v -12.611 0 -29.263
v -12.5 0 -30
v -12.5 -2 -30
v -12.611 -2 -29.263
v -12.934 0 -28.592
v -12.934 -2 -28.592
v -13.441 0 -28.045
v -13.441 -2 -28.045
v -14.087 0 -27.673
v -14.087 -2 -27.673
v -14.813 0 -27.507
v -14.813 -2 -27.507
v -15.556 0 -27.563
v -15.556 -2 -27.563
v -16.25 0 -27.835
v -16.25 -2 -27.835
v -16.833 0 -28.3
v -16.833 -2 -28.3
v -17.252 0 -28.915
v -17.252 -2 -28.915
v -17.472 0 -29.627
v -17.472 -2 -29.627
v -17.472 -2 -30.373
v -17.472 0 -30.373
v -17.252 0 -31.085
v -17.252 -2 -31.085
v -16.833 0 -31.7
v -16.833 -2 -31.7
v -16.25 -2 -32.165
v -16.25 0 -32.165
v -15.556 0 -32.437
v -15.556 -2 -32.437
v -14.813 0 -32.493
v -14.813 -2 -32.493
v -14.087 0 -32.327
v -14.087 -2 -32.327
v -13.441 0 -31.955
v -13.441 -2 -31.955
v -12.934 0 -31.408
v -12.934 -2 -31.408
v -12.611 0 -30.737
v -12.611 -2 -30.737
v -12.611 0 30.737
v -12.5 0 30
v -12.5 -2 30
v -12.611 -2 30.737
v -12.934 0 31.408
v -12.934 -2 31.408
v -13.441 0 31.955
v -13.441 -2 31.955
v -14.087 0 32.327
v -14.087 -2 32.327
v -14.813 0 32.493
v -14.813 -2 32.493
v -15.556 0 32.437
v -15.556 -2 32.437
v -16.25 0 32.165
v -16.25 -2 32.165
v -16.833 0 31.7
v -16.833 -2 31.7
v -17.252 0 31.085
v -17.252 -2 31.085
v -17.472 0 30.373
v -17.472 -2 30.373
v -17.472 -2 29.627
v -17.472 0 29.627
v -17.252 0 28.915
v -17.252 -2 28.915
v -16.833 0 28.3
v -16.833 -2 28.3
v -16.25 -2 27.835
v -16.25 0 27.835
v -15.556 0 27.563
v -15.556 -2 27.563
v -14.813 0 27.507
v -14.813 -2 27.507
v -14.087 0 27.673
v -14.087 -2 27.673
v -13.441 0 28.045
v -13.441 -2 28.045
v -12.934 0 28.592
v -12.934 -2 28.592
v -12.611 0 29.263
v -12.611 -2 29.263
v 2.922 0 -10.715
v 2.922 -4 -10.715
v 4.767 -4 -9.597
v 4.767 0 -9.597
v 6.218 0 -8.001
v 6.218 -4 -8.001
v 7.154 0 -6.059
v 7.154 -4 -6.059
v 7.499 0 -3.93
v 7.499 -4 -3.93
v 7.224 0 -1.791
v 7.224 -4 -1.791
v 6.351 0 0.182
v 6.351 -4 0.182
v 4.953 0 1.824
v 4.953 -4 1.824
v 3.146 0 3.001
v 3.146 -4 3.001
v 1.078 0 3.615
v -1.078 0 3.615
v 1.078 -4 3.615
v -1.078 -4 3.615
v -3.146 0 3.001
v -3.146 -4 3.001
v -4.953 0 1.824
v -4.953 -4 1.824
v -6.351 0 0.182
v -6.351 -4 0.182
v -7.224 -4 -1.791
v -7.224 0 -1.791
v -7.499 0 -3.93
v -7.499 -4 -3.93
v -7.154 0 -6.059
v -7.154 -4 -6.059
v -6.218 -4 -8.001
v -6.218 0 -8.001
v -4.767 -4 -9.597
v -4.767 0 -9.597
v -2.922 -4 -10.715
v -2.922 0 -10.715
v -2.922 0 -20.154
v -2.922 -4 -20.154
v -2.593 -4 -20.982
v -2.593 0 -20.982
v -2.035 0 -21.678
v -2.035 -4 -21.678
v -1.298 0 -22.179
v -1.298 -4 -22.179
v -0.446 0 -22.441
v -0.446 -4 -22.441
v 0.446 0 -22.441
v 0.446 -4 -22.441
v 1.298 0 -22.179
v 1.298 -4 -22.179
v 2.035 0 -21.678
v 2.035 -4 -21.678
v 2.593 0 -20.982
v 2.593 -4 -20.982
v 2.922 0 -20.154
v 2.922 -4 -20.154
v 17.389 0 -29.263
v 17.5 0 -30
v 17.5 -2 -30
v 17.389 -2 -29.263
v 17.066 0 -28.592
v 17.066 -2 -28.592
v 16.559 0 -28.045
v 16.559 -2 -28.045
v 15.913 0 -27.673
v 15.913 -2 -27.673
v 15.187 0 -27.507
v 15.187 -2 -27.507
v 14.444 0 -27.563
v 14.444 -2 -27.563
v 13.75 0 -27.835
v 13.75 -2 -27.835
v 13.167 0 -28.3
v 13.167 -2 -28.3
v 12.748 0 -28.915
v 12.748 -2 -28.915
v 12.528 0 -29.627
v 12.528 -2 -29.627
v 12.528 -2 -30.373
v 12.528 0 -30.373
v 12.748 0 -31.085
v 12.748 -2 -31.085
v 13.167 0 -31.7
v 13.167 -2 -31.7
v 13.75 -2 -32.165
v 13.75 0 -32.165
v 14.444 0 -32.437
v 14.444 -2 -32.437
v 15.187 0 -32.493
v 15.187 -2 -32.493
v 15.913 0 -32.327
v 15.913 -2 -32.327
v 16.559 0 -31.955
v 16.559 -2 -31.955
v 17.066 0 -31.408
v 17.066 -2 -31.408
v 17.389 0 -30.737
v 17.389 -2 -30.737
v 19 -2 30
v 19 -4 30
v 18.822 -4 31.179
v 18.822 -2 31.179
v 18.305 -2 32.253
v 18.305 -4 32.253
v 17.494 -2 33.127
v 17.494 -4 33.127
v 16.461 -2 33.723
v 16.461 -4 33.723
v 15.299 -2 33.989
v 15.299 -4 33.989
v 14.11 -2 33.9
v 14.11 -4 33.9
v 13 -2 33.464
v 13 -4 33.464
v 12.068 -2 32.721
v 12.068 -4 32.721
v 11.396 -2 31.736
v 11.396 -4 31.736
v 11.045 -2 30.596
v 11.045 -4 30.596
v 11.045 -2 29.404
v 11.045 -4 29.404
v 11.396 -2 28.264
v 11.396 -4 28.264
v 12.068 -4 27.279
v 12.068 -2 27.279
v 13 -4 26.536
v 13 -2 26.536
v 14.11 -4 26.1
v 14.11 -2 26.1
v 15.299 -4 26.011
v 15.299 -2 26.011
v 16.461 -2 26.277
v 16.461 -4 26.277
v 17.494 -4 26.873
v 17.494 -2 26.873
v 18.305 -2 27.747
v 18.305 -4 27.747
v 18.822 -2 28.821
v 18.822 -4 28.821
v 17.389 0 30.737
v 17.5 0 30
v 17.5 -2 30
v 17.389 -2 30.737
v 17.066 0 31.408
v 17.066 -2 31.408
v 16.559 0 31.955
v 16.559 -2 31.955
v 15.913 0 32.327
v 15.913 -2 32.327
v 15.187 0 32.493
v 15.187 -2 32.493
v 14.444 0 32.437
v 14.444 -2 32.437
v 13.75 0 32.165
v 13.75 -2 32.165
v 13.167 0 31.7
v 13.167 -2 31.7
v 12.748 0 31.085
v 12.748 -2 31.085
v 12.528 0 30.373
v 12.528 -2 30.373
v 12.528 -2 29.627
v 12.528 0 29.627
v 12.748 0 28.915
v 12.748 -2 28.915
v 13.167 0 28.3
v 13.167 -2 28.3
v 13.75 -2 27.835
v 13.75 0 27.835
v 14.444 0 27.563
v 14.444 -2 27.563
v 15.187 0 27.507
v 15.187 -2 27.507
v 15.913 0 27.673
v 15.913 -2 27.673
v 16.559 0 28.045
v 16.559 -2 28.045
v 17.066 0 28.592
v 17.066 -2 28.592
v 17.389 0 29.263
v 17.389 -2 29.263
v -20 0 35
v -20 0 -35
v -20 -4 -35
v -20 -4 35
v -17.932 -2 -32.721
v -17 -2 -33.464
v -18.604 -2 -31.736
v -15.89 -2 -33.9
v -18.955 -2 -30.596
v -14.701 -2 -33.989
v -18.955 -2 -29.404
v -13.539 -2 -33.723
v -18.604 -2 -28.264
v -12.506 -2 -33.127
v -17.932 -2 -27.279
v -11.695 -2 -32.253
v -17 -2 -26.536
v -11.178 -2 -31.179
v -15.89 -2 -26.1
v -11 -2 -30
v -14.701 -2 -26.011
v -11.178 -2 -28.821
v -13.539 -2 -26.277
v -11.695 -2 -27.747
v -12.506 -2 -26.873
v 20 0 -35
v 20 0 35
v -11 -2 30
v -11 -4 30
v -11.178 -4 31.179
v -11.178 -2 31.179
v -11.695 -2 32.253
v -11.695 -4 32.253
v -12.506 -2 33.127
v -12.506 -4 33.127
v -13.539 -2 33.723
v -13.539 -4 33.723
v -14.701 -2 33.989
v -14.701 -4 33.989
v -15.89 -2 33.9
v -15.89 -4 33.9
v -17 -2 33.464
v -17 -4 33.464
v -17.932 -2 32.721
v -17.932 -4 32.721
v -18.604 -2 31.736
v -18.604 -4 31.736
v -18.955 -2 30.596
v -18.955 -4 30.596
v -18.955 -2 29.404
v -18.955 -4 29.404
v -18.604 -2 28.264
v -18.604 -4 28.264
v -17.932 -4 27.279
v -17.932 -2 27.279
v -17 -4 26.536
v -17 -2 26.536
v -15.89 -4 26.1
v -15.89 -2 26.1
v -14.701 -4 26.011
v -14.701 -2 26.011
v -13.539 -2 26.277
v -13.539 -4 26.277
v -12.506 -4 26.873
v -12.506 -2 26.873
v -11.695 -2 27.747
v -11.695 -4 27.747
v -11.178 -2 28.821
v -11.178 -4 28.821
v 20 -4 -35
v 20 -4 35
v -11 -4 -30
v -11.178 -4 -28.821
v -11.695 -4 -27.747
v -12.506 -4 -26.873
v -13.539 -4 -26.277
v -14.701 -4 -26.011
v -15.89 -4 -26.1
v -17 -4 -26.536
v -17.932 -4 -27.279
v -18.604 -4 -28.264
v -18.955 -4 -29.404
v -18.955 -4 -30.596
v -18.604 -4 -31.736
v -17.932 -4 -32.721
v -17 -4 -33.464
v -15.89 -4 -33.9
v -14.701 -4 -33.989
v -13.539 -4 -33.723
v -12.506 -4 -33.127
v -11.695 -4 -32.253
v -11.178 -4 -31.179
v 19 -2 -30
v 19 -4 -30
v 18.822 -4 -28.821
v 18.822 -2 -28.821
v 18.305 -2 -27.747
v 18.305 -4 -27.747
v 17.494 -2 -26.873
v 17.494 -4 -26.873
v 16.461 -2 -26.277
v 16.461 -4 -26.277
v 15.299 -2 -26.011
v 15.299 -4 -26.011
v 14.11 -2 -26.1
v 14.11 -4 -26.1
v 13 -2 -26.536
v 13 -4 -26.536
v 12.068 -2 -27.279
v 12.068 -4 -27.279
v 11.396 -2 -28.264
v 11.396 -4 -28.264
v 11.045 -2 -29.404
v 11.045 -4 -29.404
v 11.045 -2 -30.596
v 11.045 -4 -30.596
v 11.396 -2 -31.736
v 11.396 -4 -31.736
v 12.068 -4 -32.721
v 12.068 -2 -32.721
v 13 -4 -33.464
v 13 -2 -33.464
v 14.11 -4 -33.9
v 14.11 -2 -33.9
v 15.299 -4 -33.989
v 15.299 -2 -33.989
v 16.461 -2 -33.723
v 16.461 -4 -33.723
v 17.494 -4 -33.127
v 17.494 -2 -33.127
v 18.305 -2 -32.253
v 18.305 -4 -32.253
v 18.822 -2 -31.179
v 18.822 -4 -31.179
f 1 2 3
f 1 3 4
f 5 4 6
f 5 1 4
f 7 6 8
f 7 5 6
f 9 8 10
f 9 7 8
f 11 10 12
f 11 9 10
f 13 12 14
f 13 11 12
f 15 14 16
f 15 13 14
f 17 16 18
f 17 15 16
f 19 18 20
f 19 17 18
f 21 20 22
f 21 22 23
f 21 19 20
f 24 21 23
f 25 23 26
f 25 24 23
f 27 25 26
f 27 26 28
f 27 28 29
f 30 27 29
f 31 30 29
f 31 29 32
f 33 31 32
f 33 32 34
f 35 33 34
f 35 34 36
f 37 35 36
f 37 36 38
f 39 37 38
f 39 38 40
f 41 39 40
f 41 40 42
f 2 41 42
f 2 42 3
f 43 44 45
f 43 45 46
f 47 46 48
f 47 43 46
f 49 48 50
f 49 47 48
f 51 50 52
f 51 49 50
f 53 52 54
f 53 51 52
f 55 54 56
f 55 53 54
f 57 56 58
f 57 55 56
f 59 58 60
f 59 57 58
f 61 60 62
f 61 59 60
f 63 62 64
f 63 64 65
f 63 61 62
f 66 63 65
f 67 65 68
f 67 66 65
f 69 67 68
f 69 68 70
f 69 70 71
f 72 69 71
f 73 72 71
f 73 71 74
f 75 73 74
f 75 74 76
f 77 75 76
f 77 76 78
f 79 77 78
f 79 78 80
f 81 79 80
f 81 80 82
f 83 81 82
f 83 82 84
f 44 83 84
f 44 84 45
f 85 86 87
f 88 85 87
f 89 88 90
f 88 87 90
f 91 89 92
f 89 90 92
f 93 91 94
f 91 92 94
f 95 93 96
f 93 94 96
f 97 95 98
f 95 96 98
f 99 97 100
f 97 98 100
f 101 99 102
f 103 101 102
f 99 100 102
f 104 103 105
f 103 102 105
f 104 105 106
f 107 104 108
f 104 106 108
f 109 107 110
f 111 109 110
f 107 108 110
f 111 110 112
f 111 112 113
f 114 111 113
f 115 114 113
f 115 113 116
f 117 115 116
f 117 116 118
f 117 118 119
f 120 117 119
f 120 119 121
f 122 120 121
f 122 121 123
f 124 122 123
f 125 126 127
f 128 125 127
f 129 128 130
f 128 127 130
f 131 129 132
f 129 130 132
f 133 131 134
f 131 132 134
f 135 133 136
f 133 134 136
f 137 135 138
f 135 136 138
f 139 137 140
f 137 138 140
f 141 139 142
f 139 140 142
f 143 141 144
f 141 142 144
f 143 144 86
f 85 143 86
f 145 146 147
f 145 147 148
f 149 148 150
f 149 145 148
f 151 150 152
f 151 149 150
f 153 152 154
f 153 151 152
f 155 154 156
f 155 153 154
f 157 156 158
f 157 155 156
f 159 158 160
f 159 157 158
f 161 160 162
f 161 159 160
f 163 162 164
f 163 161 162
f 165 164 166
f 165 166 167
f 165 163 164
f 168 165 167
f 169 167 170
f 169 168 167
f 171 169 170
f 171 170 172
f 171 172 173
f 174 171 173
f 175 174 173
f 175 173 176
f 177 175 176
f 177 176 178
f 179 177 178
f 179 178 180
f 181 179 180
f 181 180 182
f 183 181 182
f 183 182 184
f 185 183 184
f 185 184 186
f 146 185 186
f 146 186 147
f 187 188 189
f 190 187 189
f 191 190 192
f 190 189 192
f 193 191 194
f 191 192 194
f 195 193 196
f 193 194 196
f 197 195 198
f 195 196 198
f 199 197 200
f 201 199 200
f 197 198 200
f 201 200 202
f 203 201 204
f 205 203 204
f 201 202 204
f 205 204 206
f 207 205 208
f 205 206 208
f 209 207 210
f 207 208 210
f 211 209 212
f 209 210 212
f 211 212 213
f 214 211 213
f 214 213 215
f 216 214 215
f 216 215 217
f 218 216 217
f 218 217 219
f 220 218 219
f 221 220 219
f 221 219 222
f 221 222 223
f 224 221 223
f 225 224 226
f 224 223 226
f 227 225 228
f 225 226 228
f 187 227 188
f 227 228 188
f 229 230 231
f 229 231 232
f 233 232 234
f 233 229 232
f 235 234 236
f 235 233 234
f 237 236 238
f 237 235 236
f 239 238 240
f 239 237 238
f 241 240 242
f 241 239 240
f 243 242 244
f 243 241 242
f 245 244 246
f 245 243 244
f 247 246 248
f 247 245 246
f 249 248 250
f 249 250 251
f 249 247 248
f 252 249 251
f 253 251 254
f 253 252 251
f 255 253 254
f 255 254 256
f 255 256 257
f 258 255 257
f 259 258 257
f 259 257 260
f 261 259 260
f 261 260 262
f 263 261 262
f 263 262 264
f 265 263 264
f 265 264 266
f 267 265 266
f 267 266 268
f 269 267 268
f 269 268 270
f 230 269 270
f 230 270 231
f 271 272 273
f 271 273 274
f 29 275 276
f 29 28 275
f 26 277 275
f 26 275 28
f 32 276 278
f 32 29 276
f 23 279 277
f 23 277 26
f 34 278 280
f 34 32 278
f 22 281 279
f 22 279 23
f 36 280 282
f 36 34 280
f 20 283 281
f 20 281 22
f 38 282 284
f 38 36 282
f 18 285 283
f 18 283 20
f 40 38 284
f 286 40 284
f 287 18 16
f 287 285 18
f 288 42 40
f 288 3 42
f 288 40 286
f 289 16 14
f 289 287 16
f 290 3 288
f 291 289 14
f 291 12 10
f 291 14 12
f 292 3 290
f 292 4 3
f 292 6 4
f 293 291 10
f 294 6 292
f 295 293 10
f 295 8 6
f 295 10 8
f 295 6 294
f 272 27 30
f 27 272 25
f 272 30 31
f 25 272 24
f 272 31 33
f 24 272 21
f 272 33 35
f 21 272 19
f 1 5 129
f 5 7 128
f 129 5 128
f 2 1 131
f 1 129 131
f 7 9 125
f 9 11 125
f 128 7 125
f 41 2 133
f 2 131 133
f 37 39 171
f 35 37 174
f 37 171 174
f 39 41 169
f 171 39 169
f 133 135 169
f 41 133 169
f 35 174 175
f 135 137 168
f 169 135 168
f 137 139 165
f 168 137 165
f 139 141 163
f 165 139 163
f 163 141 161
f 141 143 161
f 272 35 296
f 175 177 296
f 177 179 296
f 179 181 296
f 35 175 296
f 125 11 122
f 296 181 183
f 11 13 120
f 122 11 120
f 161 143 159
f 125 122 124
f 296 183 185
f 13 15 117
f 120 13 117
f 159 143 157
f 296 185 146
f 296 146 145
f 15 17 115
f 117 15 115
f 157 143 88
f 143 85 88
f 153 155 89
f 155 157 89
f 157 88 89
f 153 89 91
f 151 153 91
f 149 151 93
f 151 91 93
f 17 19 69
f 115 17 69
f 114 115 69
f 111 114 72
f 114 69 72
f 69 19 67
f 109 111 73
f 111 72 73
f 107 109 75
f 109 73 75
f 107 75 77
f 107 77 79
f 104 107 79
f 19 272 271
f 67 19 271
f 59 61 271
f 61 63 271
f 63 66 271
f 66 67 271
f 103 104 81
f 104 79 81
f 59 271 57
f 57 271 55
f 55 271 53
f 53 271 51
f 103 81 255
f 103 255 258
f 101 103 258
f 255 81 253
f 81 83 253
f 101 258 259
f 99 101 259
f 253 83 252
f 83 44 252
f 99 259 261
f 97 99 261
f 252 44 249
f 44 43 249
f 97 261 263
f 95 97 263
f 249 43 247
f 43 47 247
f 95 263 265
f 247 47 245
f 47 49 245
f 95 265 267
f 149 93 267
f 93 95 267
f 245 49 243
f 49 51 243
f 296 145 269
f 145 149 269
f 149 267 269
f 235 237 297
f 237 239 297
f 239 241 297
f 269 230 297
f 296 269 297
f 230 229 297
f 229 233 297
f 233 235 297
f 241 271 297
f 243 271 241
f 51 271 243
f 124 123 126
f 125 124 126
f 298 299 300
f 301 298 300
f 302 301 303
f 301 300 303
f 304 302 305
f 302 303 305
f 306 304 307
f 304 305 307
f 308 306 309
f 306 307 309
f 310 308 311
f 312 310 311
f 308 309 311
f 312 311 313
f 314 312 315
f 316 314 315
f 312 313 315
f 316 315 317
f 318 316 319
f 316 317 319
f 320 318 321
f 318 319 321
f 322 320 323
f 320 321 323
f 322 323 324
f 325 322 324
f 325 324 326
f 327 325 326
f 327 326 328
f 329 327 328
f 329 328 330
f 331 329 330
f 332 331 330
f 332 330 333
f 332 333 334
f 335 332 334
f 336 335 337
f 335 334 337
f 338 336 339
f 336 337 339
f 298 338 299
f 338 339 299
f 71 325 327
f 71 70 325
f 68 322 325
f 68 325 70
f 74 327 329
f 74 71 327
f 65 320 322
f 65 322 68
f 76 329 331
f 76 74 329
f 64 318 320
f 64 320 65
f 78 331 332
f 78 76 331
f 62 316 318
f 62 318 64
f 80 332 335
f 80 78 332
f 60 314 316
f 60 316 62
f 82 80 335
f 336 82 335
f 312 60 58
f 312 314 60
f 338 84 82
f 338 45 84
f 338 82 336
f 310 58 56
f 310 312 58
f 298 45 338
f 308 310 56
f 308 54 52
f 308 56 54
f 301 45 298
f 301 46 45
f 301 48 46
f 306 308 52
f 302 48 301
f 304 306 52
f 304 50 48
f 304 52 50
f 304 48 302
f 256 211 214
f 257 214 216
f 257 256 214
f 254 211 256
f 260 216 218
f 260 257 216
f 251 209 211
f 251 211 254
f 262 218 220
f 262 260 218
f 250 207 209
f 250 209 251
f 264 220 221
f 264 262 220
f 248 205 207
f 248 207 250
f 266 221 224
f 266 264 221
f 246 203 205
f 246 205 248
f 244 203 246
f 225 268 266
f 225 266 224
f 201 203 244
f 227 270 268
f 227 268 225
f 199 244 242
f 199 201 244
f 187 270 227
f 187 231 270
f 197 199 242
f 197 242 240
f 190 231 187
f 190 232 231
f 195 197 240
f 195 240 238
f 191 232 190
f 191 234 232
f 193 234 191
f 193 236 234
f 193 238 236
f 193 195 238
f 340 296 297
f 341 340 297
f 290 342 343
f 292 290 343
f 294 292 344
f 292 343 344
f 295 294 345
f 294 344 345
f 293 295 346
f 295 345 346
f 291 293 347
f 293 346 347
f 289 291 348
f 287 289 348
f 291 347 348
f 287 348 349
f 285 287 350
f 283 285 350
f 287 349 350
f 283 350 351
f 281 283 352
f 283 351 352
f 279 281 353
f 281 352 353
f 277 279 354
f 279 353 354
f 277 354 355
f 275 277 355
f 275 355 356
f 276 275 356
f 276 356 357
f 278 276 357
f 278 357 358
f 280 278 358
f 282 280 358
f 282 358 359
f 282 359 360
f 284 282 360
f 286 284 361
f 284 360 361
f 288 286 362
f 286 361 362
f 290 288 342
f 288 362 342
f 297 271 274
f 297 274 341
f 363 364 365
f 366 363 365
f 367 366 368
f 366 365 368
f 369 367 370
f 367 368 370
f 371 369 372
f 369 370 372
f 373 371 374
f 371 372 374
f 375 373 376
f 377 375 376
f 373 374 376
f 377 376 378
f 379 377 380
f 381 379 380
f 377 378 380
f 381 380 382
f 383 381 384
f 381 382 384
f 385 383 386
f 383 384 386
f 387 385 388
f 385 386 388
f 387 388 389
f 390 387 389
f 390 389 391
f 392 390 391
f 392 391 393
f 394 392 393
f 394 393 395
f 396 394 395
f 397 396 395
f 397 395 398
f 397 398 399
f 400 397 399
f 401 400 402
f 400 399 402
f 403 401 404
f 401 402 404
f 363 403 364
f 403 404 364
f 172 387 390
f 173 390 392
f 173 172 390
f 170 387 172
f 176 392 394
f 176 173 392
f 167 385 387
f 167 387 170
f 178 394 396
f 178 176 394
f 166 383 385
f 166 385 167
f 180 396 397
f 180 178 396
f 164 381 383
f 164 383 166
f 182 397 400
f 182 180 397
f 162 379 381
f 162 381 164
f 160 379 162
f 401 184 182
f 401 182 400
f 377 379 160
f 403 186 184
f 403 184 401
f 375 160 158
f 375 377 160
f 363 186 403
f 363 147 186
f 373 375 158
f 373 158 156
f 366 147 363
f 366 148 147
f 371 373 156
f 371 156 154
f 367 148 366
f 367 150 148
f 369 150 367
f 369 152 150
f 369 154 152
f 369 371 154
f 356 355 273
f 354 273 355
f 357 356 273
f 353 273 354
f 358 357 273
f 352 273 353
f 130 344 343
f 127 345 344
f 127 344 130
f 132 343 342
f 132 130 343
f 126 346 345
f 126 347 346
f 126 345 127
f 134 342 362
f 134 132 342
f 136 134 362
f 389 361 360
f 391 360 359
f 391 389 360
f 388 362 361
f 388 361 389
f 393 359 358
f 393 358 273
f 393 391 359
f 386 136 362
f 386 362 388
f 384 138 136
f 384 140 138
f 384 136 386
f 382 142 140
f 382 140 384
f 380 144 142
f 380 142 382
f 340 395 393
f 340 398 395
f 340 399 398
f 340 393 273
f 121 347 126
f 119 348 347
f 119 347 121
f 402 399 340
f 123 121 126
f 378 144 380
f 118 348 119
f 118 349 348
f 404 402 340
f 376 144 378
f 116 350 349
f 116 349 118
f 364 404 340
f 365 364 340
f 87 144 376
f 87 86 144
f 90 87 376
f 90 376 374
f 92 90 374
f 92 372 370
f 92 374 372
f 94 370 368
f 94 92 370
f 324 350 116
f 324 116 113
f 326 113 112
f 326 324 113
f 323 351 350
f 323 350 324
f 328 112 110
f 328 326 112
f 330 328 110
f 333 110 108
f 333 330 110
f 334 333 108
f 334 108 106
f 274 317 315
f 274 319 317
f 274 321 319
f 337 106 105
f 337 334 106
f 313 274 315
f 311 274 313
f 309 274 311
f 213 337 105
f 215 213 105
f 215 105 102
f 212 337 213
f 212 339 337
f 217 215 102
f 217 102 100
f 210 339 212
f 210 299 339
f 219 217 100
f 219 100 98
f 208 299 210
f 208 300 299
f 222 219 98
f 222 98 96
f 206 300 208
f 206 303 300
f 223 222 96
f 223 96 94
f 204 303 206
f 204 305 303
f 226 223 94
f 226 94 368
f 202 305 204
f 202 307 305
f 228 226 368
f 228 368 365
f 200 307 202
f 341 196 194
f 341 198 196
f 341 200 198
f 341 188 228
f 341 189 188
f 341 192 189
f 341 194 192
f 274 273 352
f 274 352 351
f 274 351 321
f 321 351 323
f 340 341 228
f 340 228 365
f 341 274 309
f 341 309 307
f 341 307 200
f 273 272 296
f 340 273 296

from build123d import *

# Parameters (mm, degrees)
F0_W     = 40
F0_H     = 70
F0_R     = 2.5
F1_DEPTH = 4
F2_R     = 2.5
F2_R_2   = 4
F3_DEPTH = 2
F5_DEPTH = 25


with BuildPart() as f1:
    # F0 (on Front) → F1 (new body)
    with BuildSketch(Plane.XZ):
        Rectangle(F0_W, F0_H)
        with Locations((-15, -30)):
            Circle(F0_R, mode=Mode.SUBTRACT)
        with Locations((15, -30)):
            Circle(F0_R, mode=Mode.SUBTRACT)
        with Locations((-15, 30)):
            Circle(F0_R, mode=Mode.SUBTRACT)
        with Locations((15, 30)):
            Circle(F0_R, mode=Mode.SUBTRACT)
    extrude(amount=F1_DEPTH)

    # F2 (on face) → F3 (cut)
    with BuildSketch(Plane.XZ.offset(4)):
        with Locations((-15, 30)):
            Circle(F2_R)
        with Locations((-15, -30)):
            Circle(F2_R)
        with Locations((15, 30)):
            Circle(F2_R)
        with Locations((15, -30)):
            Circle(F2_R)
        with Locations((15, 30)):
            Circle(F2_R_2)
        with Locations((15, 30)):
            Circle(F2_R, mode=Mode.SUBTRACT)
        with Locations((15, -30)):
            Circle(F2_R_2)
        with Locations((15, -30)):
            Circle(F2_R, mode=Mode.SUBTRACT)
        with Locations((-15, -30)):
            Circle(F2_R_2)
        with Locations((-15, -30)):
            Circle(F2_R, mode=Mode.SUBTRACT)
        with Locations((-15, 30)):
            Circle(F2_R_2)
        with Locations((-15, 30)):
            Circle(F2_R, mode=Mode.SUBTRACT)
    extrude(amount=-F3_DEPTH, mode=Mode.SUBTRACT)

    # F4 (on face) → F5 (cut)
    with BuildSketch(Plane.XZ.offset(4)):
        with BuildLine():
            Line((2.921996, -20.153533), (2.921996, -10.71458))
            ThreePointArc((2.921996, -10.71458), (0, 3.692803), (-2.921996, -10.71458))
            Line((-2.921996, -10.71458), (-2.921996, -20.153533))
            ThreePointArc((-2.921996, -20.153533), (0, -22.473871), (2.921996, -20.153533))
        make_face()
    extrude(amount=-F5_DEPTH, mode=Mode.SUBTRACT)


solid = f1.part
